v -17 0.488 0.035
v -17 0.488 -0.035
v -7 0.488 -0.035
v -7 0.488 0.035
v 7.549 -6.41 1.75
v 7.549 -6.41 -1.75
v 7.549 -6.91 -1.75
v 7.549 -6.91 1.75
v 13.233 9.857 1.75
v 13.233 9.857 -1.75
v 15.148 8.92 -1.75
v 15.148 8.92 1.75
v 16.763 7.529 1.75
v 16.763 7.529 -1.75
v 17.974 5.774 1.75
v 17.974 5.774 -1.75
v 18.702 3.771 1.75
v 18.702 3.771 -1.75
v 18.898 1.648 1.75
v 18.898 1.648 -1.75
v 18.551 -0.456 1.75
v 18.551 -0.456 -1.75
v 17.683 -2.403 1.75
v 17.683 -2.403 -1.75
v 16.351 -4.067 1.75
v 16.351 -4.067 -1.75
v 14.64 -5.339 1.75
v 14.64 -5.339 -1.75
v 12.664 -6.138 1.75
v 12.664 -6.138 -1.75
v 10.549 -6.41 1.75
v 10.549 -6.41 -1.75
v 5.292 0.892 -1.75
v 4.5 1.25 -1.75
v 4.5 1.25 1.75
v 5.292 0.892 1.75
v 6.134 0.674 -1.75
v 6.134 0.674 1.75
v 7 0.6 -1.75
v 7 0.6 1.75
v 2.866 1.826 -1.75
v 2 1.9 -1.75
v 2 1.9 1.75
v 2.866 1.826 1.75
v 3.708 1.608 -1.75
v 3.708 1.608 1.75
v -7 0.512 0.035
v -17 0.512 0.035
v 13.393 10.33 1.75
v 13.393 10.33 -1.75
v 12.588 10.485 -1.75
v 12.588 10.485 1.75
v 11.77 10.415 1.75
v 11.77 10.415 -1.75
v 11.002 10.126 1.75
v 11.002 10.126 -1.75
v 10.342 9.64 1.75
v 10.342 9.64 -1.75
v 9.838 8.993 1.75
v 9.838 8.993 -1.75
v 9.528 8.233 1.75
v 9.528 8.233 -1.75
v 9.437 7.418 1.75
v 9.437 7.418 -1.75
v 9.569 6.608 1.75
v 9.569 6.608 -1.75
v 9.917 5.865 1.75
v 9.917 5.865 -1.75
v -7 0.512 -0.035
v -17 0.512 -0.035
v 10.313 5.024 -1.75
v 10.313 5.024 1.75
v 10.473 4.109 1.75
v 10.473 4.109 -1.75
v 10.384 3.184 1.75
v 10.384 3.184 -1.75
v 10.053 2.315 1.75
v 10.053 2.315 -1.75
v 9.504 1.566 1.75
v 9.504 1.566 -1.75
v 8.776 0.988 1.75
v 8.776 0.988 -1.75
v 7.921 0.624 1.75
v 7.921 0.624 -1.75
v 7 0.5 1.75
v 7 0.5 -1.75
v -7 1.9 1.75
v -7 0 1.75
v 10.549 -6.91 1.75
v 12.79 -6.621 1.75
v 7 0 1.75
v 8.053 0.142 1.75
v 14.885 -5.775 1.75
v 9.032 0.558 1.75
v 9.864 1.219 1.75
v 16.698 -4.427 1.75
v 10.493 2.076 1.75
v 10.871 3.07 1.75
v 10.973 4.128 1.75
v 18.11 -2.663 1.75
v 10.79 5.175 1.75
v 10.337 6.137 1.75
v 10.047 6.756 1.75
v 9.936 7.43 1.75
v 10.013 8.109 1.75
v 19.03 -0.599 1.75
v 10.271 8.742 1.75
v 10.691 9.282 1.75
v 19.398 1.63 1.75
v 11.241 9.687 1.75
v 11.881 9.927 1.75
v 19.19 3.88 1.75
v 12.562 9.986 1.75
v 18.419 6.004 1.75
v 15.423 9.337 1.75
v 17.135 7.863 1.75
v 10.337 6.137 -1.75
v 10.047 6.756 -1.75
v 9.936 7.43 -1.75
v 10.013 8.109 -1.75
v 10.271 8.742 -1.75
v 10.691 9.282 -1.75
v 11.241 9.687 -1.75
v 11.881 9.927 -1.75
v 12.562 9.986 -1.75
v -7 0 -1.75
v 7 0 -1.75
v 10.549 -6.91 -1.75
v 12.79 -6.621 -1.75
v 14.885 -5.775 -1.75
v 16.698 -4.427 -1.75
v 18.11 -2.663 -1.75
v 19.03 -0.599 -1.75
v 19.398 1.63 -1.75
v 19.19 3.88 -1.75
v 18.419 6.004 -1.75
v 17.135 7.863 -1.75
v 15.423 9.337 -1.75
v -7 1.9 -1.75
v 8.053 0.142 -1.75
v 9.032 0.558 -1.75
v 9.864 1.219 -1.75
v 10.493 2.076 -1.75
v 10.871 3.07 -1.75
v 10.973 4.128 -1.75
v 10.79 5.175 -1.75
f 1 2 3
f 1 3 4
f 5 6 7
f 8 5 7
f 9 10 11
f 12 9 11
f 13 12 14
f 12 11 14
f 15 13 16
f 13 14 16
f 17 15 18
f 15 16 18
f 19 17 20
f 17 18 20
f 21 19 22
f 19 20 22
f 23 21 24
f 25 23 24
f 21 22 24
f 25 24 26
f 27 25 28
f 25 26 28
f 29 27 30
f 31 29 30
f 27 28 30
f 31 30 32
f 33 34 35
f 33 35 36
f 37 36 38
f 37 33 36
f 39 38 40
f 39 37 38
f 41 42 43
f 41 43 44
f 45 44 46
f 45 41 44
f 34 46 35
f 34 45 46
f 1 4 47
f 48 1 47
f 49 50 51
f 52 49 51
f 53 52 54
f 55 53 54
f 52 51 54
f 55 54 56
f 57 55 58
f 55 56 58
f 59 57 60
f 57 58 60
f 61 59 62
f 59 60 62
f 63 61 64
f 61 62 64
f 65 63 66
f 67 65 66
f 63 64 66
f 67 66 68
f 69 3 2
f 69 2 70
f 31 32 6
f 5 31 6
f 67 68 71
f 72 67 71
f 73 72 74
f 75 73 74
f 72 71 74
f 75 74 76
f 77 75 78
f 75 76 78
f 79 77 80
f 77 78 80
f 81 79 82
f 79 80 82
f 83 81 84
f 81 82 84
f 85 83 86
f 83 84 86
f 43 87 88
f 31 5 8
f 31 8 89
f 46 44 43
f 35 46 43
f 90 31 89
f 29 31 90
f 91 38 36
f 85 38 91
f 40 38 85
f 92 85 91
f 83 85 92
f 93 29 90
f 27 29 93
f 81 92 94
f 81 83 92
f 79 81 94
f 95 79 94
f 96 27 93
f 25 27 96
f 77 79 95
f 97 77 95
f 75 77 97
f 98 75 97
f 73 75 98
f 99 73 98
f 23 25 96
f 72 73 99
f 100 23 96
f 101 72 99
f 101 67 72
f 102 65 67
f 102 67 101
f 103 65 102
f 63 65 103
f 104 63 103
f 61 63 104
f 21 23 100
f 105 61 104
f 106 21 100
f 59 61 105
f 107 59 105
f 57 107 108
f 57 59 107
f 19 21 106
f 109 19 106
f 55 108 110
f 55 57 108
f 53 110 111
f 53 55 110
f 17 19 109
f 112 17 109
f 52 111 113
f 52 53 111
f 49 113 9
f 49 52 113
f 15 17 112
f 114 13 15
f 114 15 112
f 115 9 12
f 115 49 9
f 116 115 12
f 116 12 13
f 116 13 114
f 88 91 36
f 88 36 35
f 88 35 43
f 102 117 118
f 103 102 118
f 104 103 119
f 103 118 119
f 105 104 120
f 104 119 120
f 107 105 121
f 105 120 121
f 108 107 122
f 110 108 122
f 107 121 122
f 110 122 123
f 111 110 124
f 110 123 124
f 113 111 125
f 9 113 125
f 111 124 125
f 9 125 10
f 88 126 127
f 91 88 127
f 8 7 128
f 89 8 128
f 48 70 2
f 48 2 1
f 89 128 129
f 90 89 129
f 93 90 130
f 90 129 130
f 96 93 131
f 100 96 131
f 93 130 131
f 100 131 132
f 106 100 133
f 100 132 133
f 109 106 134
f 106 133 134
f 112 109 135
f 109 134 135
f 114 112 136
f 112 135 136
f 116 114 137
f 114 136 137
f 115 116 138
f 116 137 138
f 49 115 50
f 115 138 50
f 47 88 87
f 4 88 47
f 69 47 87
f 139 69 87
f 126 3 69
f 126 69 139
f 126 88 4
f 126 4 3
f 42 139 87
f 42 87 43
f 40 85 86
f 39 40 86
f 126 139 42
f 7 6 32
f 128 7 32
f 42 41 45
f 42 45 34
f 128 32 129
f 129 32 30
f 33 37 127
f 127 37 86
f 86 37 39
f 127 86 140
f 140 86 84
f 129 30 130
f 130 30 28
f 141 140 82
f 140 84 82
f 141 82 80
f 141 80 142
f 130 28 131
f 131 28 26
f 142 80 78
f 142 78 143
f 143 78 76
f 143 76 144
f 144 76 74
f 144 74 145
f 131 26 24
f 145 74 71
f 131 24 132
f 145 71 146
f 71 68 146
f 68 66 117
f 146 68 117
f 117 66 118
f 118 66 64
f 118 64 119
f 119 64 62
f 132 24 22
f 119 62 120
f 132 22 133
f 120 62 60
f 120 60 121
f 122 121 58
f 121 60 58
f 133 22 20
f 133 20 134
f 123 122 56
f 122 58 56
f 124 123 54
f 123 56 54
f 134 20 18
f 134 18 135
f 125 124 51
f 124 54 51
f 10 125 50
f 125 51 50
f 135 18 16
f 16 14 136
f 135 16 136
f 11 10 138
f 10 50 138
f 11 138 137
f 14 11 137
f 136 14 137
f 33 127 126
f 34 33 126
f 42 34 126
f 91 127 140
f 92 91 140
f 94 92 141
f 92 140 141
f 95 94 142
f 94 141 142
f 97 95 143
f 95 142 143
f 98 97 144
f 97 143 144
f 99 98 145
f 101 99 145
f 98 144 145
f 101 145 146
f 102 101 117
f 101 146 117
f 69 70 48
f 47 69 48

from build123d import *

# Parameters (mm, degrees)
SKETCH1_W               = 14
SKETCH1_H               = 3.5
BOSS_EXTRUDE1_DEPTH     = 1.9
CUT_EXTRUDE1_DEPTH      = 8.461400673
CUT_EXTRUDE1_DEPTH_BACK = 8.461400673
SKETCH4_W               = 0.07
SKETCH4_H               = 0.024
BOSS_EXTRUDE3_DEPTH     = 10
SWEEP1_START            = -1.75
SWEEP1_DEPTH            = 3.5


# Read off the part's stored shape, not the designer's step: Sweep1
with BuildPart() as part:
    # Sketch1 → Boss-Extrude1 (new body)
    with BuildSketch(Plane(origin=(0, 0, 0), x_dir=(1, 0, 0), z_dir=(0, 1, 0))):
        Rectangle(SKETCH1_W, SKETCH1_H)
    extrude(amount=BOSS_EXTRUDE1_DEPTH)

    # Sketch3 → Cut-Extrude1 (cut, two sides: drawn at the far end of the back side and taken through both)
    with BuildSketch(Plane.XY.offset(-CUT_EXTRUDE1_DEPTH_BACK)):
        with BuildLine():
            Line((7, 0.6), (7, 1.9))
            Line((7, 1.9), (2, 1.9))
            ThreePointArc((2, 1.9), (3.291559135, 1.734842828), (4.5, 1.25))
            ThreePointArc((4.5, 1.25), (5.708440865, 0.765157172), (7, 0.6))
        make_face()
    extrude(amount=CUT_EXTRUDE1_DEPTH + CUT_EXTRUDE1_DEPTH_BACK, mode=Mode.SUBTRACT)

    # Sketch4 → Boss-Extrude3 (add)
    with BuildSketch(Plane.ZY.offset(7)):
        with Locations((0, 0.5)):
            Rectangle(SKETCH4_W, SKETCH4_H)
    extrude(amount=BOSS_EXTRUDE3_DEPTH)

    # Sweep1 outline → Sweep1 (add)
    with BuildSketch(Plane.XY.offset(SWEEP1_START)):
        with BuildLine():
            Line((10.549140882, -6.409601789), (7.549140882, -6.409601789))
            Line((7.549140882, -6.409601789), (7.549140882, -6.909601789))
            Line((7.549140882, -6.909601789), (10.549140882, -6.909601789))
            ThreePointArc((10.549140882, -6.909601789), (19.285582655, 0.503552751), (13.39347688, 10.330218748))
            ThreePointArc((13.39347688, 10.330218748), (10.067527148, 9.33364199), (9.916983753, 5.864860714))
            ThreePointArc((9.916983753, 5.864860714), (10.053298409, 2.315301648), (7, 0.5))
            Line((7, 0.5), (7, 0))
            ThreePointArc((7, 0), (10.492566046, 2.076462911), (10.336640265, 6.136684944))
            ThreePointArc((10.336640265, 6.136684944), (10.462056054, 9.026482516), (13.232862483, 9.85671794))
            ThreePointArc((13.232862483, 9.85671794), (18.792251933, 0.584945612), (10.549140882, -6.409601789))
        make_face()
    extrude(amount=SWEEP1_DEPTH)


solid = part.part
